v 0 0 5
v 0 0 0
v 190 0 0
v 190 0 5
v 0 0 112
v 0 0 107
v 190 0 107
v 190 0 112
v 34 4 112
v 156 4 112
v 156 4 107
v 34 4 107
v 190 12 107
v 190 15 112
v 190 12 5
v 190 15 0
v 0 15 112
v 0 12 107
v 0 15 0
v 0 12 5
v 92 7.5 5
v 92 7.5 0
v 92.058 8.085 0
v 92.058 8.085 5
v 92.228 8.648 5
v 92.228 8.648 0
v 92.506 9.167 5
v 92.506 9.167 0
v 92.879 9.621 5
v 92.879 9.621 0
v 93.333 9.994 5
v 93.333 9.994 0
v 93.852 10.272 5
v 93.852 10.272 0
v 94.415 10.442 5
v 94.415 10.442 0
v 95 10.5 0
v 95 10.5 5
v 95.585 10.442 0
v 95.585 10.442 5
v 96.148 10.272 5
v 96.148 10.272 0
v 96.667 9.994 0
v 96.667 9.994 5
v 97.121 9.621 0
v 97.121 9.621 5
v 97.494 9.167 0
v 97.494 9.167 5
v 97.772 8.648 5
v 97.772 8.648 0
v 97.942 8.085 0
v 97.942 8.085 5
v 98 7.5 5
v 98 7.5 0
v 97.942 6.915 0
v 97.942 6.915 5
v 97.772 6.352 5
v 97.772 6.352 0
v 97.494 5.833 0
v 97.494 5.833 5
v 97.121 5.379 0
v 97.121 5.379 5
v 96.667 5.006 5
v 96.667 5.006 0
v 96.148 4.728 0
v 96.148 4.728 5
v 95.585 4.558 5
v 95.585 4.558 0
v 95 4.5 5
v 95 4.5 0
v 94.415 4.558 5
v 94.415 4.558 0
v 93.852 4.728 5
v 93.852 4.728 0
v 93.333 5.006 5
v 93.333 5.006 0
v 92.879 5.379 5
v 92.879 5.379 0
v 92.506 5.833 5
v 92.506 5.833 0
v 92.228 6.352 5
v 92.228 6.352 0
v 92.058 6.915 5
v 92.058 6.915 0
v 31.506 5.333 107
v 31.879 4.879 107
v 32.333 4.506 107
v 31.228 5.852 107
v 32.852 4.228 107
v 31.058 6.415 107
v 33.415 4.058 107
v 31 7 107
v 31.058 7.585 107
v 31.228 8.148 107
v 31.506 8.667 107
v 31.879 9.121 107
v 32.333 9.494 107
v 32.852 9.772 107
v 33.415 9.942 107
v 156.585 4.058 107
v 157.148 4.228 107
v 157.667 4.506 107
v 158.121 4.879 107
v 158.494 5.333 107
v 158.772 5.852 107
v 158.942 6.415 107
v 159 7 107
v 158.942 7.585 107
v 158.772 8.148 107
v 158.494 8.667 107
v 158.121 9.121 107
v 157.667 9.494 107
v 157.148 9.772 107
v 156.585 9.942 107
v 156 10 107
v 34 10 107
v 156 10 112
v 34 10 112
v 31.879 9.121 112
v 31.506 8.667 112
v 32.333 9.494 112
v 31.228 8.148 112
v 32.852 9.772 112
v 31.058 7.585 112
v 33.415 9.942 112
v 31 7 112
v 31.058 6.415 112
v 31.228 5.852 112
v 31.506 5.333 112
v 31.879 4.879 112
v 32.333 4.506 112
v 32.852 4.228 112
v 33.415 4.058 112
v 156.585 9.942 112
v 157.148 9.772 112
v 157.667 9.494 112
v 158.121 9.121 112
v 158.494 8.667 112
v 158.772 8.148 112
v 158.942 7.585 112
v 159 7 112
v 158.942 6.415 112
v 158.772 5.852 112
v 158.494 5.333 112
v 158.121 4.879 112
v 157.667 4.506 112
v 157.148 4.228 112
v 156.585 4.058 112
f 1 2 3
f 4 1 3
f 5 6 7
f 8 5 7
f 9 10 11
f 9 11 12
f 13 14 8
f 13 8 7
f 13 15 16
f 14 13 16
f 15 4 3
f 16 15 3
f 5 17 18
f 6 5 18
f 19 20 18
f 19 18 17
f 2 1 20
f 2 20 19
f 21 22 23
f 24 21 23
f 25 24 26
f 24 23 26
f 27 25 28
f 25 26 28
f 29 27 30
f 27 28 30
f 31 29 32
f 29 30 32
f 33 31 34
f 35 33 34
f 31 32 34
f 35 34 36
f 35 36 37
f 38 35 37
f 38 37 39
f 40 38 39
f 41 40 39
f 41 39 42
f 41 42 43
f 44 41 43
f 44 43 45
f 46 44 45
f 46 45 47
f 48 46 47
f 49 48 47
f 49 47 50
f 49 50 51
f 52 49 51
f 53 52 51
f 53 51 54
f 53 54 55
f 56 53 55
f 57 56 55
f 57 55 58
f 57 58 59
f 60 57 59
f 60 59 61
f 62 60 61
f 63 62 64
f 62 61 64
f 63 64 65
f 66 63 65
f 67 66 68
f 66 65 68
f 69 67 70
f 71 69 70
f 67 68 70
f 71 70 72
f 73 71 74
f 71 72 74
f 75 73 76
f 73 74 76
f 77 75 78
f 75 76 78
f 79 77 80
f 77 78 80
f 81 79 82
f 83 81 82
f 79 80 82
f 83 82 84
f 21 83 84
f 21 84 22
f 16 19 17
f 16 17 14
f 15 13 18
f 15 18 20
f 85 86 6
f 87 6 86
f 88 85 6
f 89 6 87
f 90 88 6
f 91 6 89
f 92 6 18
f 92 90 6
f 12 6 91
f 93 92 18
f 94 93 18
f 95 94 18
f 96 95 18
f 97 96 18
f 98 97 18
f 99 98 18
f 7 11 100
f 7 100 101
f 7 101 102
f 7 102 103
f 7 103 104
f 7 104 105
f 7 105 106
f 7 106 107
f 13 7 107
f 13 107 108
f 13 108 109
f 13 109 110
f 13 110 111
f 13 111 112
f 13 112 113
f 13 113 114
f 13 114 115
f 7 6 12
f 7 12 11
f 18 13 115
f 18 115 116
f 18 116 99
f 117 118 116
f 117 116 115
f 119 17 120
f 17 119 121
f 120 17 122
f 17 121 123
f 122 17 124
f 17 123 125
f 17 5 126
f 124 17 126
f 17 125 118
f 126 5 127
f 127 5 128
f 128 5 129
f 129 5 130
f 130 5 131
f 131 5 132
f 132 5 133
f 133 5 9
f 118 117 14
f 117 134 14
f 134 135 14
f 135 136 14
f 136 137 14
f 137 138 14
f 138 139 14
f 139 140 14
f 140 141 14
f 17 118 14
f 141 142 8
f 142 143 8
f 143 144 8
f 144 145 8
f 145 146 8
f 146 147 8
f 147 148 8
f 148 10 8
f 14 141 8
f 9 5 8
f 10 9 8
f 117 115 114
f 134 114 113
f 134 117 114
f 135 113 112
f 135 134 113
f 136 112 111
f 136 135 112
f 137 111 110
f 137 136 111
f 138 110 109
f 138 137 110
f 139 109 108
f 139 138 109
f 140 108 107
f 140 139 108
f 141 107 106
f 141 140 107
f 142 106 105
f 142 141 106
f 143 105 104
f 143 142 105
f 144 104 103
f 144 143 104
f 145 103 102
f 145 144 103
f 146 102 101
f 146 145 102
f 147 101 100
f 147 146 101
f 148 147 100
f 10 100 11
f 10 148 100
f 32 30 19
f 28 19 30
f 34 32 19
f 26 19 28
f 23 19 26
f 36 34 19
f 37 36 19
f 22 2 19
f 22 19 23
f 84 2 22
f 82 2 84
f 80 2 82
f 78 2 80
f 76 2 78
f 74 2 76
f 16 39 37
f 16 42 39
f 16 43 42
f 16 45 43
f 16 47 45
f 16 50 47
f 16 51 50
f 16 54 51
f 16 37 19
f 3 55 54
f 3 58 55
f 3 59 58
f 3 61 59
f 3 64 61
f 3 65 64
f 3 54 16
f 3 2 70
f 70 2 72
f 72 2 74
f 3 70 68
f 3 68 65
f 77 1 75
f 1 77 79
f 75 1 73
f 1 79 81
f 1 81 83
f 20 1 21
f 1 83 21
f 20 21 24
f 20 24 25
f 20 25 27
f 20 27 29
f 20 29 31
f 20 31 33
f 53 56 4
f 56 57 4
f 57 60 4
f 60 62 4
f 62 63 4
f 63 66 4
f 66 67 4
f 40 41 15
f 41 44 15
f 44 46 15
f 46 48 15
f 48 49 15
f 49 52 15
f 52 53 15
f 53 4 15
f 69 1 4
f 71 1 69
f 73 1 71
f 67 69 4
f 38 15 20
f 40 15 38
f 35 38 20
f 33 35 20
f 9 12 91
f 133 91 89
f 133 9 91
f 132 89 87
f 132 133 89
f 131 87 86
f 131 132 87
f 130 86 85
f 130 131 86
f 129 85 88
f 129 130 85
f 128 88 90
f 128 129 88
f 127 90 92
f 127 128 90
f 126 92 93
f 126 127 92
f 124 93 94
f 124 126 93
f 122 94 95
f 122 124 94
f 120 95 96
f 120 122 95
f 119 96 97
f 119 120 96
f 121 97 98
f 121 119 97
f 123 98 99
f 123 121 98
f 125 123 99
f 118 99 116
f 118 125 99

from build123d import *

# Parameters (mm, degrees)
SKETCH1_W           = 190
SKETCH1_H           = 112
BOSS_EXTRUDE1_DEPTH = 15
SKETCH5_W           = 102
SKETCH5_H           = 12
CUT_EXTRUDE3_DEPTH  = 222.06333934
CUT_EXTRUDE4_DEPTH  = 10
SKETCH6_R           = 3
CUT_EXTRUDE5_DEPTH  = 10


with BuildPart() as part:
    # Sketch1 → Boss-Extrude1 (new body)
    with BuildSketch(Plane(origin=(0, 0, 0), x_dir=(1, 0, 0), z_dir=(0, 1, 0))):
        with Locations((95, -56)):
            Rectangle(SKETCH1_W, SKETCH1_H)
    extrude(amount=BOSS_EXTRUDE1_DEPTH)

    # Sketch5 → Cut-Extrude3 (cut, through all)
    with BuildSketch(Plane(origin=(190, 0, 0), x_dir=(0, 0, -1), z_dir=(1, 0, 0))):
        with Locations((-56, 6)):
            Rectangle(SKETCH5_W, SKETCH5_H)
    extrude(amount=-CUT_EXTRUDE3_DEPTH, mode=Mode.SUBTRACT)

    # Sketch2 → Cut-Extrude4 (cut)
    with BuildSketch(Plane.XY.offset(112)):
        with BuildLine():
            Line((34, 10), (156, 10))
            ThreePointArc((156, 10), (159, 7), (156, 4))
            Line((156, 4), (34, 4))
            ThreePointArc((34, 4), (31, 7), (34, 10))
        make_face()
    extrude(amount=-CUT_EXTRUDE4_DEPTH, mode=Mode.SUBTRACT)

    # Sketch6 → Cut-Extrude5 (cut)
    with BuildSketch(Plane(origin=(0, 0, 0), x_dir=(-1, 0, 0), z_dir=(0, 0, -1))):
        with Locations((-95, 7.5)):
            Circle(SKETCH6_R)
    extrude(amount=-CUT_EXTRUDE5_DEPTH, mode=Mode.SUBTRACT)


solid = part.part
